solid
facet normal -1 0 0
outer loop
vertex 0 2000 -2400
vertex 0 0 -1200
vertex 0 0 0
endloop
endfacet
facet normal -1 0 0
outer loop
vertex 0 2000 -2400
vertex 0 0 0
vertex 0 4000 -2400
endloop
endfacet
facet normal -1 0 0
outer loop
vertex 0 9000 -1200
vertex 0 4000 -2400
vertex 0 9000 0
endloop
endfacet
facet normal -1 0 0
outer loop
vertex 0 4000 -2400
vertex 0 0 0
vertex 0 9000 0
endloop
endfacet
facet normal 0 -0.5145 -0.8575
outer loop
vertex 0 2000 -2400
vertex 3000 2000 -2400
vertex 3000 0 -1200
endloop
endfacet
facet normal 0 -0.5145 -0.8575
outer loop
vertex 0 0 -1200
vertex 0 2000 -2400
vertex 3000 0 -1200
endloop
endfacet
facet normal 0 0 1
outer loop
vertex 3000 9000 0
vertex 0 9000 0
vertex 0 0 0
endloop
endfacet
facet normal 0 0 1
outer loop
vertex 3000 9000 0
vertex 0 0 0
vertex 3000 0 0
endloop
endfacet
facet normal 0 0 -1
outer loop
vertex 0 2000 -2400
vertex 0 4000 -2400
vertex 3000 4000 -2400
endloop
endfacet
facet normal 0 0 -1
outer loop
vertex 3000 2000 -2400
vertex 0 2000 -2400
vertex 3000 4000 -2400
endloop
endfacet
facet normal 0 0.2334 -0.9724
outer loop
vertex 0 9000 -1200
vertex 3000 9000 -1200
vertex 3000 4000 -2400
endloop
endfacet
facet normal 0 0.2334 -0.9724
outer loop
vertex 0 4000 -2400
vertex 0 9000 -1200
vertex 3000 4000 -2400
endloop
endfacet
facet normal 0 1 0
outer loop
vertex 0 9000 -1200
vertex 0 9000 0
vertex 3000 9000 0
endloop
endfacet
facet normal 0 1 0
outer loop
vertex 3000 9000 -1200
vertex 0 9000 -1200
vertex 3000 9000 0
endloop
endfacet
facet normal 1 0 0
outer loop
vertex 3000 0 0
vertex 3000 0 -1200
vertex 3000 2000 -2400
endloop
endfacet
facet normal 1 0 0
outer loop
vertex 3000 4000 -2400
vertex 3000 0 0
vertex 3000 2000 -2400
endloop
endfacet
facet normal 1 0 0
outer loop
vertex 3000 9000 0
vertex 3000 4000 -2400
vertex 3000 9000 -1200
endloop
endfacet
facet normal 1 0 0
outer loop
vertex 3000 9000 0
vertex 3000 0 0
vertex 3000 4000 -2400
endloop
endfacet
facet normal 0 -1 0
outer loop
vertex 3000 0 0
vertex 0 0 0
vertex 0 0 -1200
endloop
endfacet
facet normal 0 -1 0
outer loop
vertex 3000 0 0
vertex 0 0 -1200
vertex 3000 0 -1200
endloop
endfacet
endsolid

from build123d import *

# Parameters (mm, degrees)
F0_W     = 3000
F0_H     = 9000
F1_DEPTH = 2400
F3_DEPTH = 3000.001


with BuildPart() as f1:
    # F0 (on Top) → F1 (new body)
    with BuildSketch(Plane.XY):
        with Locations((1500, 4500)):
            Rectangle(F0_W, F0_H)
    extrude(amount=-F1_DEPTH)

    # F2 (on face) → F3 (cut, through all)
    with BuildSketch(Plane.YZ.offset(3000)):
        Polygon((0, -1200), (0, -2400), (2000, -2400), align=None)
        Polygon((9000, -1200), (4000, -2400), (9000, -2400), align=None)
    extrude(amount=-F3_DEPTH, mode=Mode.SUBTRACT)


solid = f1.part
